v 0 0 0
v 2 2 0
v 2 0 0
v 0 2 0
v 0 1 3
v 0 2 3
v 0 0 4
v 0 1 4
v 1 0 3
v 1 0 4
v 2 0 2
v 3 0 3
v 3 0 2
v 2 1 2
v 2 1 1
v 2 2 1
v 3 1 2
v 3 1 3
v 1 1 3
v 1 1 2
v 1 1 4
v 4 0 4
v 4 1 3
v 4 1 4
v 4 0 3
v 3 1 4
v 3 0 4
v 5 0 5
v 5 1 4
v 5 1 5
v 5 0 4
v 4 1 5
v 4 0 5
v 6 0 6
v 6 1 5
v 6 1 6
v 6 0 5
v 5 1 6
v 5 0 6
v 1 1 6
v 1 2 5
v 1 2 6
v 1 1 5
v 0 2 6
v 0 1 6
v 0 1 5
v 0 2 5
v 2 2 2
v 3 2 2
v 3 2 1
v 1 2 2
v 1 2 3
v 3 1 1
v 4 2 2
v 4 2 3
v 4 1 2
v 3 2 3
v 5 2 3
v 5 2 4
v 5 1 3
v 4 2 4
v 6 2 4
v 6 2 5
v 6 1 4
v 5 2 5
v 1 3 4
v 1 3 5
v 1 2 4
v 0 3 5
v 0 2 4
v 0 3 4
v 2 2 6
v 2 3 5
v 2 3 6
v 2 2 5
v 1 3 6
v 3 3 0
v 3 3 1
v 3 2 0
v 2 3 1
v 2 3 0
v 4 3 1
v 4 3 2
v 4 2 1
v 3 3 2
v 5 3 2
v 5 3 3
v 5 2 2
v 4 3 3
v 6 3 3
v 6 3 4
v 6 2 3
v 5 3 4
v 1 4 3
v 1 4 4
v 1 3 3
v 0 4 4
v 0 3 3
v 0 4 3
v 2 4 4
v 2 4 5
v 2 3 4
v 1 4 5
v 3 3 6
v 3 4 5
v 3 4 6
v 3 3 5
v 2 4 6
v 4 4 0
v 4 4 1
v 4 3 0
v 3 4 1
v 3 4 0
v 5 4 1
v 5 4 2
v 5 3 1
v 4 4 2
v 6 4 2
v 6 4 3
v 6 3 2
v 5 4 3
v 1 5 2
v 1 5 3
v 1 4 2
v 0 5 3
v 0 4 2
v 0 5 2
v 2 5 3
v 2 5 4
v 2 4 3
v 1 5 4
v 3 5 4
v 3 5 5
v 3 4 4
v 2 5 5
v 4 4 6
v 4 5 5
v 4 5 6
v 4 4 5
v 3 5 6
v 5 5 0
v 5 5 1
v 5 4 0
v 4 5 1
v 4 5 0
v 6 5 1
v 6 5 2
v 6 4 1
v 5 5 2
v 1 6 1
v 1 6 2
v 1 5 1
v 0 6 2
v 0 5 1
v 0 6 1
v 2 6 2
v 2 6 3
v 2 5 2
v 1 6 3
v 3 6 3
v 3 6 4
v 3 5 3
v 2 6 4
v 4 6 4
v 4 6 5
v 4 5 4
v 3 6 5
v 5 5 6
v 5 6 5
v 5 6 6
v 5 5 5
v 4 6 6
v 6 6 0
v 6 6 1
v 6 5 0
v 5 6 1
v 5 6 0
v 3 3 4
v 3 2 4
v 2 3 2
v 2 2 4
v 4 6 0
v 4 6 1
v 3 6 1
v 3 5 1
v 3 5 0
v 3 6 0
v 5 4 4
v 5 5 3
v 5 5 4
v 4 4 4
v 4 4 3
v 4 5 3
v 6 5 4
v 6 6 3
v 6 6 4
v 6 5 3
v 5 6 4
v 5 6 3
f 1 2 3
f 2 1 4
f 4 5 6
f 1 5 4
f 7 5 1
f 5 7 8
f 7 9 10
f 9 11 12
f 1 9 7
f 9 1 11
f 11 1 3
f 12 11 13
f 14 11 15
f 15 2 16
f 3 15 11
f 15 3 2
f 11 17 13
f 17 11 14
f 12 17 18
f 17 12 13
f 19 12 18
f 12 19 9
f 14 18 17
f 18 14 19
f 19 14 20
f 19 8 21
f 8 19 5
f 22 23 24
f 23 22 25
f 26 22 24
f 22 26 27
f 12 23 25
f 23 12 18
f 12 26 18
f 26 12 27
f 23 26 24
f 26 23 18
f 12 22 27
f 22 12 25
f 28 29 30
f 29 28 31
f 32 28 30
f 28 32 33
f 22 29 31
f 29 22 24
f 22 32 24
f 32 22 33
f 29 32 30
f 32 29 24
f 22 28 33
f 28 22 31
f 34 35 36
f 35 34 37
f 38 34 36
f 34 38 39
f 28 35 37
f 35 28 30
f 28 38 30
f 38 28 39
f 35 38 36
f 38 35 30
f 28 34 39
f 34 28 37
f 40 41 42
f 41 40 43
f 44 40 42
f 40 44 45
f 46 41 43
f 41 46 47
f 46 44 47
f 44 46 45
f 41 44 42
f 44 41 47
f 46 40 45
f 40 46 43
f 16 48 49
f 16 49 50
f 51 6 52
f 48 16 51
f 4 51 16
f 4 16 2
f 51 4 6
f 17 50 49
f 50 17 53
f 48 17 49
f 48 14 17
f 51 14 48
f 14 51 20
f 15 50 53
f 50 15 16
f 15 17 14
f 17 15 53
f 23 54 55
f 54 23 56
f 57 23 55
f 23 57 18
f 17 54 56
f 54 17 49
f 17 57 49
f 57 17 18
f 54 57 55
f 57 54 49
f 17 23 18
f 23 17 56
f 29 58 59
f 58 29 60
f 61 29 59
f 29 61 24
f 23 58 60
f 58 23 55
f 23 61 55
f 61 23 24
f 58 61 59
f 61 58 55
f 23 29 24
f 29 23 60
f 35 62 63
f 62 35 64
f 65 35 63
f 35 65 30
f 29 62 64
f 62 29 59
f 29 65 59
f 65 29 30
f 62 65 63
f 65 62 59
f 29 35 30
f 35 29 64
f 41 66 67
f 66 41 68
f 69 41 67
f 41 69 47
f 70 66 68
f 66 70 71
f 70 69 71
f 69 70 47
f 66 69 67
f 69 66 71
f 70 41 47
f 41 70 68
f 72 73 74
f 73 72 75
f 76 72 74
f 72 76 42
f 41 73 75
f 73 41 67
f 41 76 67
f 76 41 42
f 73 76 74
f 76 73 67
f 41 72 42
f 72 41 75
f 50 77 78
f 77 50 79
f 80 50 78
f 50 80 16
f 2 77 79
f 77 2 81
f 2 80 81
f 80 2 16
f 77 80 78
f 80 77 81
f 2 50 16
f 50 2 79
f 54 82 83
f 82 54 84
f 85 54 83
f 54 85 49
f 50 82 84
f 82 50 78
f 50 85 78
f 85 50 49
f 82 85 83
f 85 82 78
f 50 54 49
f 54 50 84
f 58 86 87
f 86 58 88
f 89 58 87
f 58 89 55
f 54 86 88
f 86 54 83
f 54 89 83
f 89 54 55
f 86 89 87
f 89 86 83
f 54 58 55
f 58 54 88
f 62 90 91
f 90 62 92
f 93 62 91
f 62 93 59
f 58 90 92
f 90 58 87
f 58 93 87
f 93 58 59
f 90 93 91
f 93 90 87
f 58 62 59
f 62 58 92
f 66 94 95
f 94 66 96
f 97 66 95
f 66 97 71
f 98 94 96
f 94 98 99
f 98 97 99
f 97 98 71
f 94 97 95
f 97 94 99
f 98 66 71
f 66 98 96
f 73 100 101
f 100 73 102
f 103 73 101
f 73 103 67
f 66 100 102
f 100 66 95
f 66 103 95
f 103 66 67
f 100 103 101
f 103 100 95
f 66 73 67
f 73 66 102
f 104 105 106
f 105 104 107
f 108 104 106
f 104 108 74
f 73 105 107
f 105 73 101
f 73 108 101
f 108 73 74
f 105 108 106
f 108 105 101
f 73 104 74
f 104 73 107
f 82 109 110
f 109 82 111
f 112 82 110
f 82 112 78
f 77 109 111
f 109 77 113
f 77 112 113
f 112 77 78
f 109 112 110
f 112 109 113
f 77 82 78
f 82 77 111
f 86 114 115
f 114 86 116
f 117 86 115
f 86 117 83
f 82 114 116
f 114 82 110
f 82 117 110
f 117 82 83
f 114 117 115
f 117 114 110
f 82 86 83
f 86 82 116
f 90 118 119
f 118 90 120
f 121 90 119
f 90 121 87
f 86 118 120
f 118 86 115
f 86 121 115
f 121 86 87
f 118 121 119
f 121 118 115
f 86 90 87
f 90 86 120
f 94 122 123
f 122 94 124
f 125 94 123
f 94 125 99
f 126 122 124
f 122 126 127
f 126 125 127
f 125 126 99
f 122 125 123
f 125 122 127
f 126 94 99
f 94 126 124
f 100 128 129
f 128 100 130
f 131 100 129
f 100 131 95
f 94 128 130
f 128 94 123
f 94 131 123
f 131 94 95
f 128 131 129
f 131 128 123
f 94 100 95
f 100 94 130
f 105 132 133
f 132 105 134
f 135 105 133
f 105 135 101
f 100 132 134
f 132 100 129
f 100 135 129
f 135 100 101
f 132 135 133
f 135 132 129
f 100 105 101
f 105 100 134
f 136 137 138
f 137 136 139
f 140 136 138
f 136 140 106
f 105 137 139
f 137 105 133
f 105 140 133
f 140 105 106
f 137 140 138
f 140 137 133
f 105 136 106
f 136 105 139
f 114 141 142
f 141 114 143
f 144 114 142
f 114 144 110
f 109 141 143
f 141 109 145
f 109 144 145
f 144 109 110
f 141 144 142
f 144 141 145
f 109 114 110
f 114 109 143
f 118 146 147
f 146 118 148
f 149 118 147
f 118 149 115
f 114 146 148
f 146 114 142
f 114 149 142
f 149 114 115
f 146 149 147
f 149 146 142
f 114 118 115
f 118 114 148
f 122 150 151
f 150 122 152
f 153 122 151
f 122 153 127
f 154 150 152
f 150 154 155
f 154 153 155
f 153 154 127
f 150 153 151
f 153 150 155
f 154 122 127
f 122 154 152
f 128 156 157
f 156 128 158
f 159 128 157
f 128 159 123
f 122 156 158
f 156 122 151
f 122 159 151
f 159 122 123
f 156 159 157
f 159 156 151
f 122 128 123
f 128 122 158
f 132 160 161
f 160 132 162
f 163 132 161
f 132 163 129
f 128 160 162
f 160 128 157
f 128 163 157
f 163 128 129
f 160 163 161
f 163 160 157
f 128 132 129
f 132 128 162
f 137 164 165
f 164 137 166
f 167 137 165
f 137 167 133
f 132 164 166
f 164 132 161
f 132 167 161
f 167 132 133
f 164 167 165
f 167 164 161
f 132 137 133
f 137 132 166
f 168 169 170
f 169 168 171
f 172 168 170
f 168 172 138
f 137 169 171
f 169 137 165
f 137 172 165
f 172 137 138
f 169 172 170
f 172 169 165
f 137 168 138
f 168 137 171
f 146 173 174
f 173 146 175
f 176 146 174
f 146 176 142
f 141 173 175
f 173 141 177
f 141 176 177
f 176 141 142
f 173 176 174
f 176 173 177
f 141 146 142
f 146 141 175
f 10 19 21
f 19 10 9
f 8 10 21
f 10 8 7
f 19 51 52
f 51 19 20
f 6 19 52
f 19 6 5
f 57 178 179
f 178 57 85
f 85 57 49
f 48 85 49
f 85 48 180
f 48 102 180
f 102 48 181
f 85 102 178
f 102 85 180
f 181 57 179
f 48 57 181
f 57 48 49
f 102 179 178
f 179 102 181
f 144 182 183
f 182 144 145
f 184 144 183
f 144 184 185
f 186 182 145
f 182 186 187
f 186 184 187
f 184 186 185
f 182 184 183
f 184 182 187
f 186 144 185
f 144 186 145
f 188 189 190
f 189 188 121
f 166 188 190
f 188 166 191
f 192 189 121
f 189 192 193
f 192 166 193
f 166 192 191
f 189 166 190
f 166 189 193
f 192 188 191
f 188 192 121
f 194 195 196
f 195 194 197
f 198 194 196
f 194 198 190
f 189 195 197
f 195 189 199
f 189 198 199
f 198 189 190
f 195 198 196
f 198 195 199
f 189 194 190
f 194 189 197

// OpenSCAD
union() {
    translate([0, 0, 0]) cube([1, 1, 1]);
    translate([1, 0, 1]) cube([1, 1, 1]);
    translate([2, 0, 2]) cube([1, 1, 1]);
    translate([3, 0, 3]) cube([1, 1, 1]);
    translate([4, 0, 4]) cube([1, 1, 1]);
    translate([5, 0, 5]) cube([1, 1, 1]);
    translate([0, 1, 5]) cube([1, 1, 1]);
    translate([1, 1, 0]) cube([1, 1, 1]);
    translate([2, 1, 1]) cube([1, 1, 1]);
    translate([3, 1, 2]) cube([1, 1, 1]);
    translate([4, 1, 3]) cube([1, 1, 1]);
    translate([5, 1, 4]) cube([1, 1, 1]);
    translate([0, 2, 4]) cube([1, 1, 1]);
    translate([1, 2, 5]) cube([1, 1, 1]);
    translate([2, 2, 0]) cube([1, 1, 1]);
    translate([3, 2, 1]) cube([1, 1, 1]);
    translate([4, 2, 2]) cube([1, 1, 1]);
    translate([5, 2, 3]) cube([1, 1, 1]);
    translate([0, 3, 3]) cube([1, 1, 1]);
    translate([1, 3, 4]) cube([1, 1, 1]);
    translate([2, 3, 5]) cube([1, 1, 1]);
    translate([3, 3, 0]) cube([1, 1, 1]);
    translate([4, 3, 1]) cube([1, 1, 1]);
    translate([5, 3, 2]) cube([1, 1, 1]);
    translate([0, 4, 2]) cube([1, 1, 1]);
    translate([1, 4, 3]) cube([1, 1, 1]);
    translate([2, 4, 4]) cube([1, 1, 1]);
    translate([3, 4, 5]) cube([1, 1, 1]);
    translate([4, 4, 0]) cube([1, 1, 1]);
    translate([5, 4, 1]) cube([1, 1, 1]);
    translate([0, 5, 1]) cube([1, 1, 1]);
    translate([1, 5, 2]) cube([1, 1, 1]);
    translate([2, 5, 3]) cube([1, 1, 1]);
    translate([3, 5, 4]) cube([1, 1, 1]);
    translate([4, 5, 5]) cube([1, 1, 1]);
    translate([5, 5, 0]) cube([1, 1, 1]);
    translate([0, 0, 1]) cube([1, 1, 1]);
    translate([0, 0, 2]) cube([1, 1, 1]);
    translate([0, 0, 3]) cube([1, 1, 1]);
    translate([0, 1, 0]) cube([1, 1, 1]);
    translate([0, 1, 1]) cube([1, 1, 1]);
    translate([0, 1, 2]) cube([1, 1, 1]);
    translate([1, 0, 0]) cube([1, 1, 1]);
    translate([1, 0, 2]) cube([1, 1, 1]);
    translate([1, 1, 1]) cube([1, 1, 1]);
    translate([2, 2, 2]) cube([1, 1, 1]);
    translate([2, 2, 3]) cube([1, 1, 1]);
    translate([3, 5, 0]) cube([1, 1, 1]);
    translate([4, 4, 3]) cube([1, 1, 1]);
    translate([5, 5, 3]) cube([1, 1, 1]);
}
